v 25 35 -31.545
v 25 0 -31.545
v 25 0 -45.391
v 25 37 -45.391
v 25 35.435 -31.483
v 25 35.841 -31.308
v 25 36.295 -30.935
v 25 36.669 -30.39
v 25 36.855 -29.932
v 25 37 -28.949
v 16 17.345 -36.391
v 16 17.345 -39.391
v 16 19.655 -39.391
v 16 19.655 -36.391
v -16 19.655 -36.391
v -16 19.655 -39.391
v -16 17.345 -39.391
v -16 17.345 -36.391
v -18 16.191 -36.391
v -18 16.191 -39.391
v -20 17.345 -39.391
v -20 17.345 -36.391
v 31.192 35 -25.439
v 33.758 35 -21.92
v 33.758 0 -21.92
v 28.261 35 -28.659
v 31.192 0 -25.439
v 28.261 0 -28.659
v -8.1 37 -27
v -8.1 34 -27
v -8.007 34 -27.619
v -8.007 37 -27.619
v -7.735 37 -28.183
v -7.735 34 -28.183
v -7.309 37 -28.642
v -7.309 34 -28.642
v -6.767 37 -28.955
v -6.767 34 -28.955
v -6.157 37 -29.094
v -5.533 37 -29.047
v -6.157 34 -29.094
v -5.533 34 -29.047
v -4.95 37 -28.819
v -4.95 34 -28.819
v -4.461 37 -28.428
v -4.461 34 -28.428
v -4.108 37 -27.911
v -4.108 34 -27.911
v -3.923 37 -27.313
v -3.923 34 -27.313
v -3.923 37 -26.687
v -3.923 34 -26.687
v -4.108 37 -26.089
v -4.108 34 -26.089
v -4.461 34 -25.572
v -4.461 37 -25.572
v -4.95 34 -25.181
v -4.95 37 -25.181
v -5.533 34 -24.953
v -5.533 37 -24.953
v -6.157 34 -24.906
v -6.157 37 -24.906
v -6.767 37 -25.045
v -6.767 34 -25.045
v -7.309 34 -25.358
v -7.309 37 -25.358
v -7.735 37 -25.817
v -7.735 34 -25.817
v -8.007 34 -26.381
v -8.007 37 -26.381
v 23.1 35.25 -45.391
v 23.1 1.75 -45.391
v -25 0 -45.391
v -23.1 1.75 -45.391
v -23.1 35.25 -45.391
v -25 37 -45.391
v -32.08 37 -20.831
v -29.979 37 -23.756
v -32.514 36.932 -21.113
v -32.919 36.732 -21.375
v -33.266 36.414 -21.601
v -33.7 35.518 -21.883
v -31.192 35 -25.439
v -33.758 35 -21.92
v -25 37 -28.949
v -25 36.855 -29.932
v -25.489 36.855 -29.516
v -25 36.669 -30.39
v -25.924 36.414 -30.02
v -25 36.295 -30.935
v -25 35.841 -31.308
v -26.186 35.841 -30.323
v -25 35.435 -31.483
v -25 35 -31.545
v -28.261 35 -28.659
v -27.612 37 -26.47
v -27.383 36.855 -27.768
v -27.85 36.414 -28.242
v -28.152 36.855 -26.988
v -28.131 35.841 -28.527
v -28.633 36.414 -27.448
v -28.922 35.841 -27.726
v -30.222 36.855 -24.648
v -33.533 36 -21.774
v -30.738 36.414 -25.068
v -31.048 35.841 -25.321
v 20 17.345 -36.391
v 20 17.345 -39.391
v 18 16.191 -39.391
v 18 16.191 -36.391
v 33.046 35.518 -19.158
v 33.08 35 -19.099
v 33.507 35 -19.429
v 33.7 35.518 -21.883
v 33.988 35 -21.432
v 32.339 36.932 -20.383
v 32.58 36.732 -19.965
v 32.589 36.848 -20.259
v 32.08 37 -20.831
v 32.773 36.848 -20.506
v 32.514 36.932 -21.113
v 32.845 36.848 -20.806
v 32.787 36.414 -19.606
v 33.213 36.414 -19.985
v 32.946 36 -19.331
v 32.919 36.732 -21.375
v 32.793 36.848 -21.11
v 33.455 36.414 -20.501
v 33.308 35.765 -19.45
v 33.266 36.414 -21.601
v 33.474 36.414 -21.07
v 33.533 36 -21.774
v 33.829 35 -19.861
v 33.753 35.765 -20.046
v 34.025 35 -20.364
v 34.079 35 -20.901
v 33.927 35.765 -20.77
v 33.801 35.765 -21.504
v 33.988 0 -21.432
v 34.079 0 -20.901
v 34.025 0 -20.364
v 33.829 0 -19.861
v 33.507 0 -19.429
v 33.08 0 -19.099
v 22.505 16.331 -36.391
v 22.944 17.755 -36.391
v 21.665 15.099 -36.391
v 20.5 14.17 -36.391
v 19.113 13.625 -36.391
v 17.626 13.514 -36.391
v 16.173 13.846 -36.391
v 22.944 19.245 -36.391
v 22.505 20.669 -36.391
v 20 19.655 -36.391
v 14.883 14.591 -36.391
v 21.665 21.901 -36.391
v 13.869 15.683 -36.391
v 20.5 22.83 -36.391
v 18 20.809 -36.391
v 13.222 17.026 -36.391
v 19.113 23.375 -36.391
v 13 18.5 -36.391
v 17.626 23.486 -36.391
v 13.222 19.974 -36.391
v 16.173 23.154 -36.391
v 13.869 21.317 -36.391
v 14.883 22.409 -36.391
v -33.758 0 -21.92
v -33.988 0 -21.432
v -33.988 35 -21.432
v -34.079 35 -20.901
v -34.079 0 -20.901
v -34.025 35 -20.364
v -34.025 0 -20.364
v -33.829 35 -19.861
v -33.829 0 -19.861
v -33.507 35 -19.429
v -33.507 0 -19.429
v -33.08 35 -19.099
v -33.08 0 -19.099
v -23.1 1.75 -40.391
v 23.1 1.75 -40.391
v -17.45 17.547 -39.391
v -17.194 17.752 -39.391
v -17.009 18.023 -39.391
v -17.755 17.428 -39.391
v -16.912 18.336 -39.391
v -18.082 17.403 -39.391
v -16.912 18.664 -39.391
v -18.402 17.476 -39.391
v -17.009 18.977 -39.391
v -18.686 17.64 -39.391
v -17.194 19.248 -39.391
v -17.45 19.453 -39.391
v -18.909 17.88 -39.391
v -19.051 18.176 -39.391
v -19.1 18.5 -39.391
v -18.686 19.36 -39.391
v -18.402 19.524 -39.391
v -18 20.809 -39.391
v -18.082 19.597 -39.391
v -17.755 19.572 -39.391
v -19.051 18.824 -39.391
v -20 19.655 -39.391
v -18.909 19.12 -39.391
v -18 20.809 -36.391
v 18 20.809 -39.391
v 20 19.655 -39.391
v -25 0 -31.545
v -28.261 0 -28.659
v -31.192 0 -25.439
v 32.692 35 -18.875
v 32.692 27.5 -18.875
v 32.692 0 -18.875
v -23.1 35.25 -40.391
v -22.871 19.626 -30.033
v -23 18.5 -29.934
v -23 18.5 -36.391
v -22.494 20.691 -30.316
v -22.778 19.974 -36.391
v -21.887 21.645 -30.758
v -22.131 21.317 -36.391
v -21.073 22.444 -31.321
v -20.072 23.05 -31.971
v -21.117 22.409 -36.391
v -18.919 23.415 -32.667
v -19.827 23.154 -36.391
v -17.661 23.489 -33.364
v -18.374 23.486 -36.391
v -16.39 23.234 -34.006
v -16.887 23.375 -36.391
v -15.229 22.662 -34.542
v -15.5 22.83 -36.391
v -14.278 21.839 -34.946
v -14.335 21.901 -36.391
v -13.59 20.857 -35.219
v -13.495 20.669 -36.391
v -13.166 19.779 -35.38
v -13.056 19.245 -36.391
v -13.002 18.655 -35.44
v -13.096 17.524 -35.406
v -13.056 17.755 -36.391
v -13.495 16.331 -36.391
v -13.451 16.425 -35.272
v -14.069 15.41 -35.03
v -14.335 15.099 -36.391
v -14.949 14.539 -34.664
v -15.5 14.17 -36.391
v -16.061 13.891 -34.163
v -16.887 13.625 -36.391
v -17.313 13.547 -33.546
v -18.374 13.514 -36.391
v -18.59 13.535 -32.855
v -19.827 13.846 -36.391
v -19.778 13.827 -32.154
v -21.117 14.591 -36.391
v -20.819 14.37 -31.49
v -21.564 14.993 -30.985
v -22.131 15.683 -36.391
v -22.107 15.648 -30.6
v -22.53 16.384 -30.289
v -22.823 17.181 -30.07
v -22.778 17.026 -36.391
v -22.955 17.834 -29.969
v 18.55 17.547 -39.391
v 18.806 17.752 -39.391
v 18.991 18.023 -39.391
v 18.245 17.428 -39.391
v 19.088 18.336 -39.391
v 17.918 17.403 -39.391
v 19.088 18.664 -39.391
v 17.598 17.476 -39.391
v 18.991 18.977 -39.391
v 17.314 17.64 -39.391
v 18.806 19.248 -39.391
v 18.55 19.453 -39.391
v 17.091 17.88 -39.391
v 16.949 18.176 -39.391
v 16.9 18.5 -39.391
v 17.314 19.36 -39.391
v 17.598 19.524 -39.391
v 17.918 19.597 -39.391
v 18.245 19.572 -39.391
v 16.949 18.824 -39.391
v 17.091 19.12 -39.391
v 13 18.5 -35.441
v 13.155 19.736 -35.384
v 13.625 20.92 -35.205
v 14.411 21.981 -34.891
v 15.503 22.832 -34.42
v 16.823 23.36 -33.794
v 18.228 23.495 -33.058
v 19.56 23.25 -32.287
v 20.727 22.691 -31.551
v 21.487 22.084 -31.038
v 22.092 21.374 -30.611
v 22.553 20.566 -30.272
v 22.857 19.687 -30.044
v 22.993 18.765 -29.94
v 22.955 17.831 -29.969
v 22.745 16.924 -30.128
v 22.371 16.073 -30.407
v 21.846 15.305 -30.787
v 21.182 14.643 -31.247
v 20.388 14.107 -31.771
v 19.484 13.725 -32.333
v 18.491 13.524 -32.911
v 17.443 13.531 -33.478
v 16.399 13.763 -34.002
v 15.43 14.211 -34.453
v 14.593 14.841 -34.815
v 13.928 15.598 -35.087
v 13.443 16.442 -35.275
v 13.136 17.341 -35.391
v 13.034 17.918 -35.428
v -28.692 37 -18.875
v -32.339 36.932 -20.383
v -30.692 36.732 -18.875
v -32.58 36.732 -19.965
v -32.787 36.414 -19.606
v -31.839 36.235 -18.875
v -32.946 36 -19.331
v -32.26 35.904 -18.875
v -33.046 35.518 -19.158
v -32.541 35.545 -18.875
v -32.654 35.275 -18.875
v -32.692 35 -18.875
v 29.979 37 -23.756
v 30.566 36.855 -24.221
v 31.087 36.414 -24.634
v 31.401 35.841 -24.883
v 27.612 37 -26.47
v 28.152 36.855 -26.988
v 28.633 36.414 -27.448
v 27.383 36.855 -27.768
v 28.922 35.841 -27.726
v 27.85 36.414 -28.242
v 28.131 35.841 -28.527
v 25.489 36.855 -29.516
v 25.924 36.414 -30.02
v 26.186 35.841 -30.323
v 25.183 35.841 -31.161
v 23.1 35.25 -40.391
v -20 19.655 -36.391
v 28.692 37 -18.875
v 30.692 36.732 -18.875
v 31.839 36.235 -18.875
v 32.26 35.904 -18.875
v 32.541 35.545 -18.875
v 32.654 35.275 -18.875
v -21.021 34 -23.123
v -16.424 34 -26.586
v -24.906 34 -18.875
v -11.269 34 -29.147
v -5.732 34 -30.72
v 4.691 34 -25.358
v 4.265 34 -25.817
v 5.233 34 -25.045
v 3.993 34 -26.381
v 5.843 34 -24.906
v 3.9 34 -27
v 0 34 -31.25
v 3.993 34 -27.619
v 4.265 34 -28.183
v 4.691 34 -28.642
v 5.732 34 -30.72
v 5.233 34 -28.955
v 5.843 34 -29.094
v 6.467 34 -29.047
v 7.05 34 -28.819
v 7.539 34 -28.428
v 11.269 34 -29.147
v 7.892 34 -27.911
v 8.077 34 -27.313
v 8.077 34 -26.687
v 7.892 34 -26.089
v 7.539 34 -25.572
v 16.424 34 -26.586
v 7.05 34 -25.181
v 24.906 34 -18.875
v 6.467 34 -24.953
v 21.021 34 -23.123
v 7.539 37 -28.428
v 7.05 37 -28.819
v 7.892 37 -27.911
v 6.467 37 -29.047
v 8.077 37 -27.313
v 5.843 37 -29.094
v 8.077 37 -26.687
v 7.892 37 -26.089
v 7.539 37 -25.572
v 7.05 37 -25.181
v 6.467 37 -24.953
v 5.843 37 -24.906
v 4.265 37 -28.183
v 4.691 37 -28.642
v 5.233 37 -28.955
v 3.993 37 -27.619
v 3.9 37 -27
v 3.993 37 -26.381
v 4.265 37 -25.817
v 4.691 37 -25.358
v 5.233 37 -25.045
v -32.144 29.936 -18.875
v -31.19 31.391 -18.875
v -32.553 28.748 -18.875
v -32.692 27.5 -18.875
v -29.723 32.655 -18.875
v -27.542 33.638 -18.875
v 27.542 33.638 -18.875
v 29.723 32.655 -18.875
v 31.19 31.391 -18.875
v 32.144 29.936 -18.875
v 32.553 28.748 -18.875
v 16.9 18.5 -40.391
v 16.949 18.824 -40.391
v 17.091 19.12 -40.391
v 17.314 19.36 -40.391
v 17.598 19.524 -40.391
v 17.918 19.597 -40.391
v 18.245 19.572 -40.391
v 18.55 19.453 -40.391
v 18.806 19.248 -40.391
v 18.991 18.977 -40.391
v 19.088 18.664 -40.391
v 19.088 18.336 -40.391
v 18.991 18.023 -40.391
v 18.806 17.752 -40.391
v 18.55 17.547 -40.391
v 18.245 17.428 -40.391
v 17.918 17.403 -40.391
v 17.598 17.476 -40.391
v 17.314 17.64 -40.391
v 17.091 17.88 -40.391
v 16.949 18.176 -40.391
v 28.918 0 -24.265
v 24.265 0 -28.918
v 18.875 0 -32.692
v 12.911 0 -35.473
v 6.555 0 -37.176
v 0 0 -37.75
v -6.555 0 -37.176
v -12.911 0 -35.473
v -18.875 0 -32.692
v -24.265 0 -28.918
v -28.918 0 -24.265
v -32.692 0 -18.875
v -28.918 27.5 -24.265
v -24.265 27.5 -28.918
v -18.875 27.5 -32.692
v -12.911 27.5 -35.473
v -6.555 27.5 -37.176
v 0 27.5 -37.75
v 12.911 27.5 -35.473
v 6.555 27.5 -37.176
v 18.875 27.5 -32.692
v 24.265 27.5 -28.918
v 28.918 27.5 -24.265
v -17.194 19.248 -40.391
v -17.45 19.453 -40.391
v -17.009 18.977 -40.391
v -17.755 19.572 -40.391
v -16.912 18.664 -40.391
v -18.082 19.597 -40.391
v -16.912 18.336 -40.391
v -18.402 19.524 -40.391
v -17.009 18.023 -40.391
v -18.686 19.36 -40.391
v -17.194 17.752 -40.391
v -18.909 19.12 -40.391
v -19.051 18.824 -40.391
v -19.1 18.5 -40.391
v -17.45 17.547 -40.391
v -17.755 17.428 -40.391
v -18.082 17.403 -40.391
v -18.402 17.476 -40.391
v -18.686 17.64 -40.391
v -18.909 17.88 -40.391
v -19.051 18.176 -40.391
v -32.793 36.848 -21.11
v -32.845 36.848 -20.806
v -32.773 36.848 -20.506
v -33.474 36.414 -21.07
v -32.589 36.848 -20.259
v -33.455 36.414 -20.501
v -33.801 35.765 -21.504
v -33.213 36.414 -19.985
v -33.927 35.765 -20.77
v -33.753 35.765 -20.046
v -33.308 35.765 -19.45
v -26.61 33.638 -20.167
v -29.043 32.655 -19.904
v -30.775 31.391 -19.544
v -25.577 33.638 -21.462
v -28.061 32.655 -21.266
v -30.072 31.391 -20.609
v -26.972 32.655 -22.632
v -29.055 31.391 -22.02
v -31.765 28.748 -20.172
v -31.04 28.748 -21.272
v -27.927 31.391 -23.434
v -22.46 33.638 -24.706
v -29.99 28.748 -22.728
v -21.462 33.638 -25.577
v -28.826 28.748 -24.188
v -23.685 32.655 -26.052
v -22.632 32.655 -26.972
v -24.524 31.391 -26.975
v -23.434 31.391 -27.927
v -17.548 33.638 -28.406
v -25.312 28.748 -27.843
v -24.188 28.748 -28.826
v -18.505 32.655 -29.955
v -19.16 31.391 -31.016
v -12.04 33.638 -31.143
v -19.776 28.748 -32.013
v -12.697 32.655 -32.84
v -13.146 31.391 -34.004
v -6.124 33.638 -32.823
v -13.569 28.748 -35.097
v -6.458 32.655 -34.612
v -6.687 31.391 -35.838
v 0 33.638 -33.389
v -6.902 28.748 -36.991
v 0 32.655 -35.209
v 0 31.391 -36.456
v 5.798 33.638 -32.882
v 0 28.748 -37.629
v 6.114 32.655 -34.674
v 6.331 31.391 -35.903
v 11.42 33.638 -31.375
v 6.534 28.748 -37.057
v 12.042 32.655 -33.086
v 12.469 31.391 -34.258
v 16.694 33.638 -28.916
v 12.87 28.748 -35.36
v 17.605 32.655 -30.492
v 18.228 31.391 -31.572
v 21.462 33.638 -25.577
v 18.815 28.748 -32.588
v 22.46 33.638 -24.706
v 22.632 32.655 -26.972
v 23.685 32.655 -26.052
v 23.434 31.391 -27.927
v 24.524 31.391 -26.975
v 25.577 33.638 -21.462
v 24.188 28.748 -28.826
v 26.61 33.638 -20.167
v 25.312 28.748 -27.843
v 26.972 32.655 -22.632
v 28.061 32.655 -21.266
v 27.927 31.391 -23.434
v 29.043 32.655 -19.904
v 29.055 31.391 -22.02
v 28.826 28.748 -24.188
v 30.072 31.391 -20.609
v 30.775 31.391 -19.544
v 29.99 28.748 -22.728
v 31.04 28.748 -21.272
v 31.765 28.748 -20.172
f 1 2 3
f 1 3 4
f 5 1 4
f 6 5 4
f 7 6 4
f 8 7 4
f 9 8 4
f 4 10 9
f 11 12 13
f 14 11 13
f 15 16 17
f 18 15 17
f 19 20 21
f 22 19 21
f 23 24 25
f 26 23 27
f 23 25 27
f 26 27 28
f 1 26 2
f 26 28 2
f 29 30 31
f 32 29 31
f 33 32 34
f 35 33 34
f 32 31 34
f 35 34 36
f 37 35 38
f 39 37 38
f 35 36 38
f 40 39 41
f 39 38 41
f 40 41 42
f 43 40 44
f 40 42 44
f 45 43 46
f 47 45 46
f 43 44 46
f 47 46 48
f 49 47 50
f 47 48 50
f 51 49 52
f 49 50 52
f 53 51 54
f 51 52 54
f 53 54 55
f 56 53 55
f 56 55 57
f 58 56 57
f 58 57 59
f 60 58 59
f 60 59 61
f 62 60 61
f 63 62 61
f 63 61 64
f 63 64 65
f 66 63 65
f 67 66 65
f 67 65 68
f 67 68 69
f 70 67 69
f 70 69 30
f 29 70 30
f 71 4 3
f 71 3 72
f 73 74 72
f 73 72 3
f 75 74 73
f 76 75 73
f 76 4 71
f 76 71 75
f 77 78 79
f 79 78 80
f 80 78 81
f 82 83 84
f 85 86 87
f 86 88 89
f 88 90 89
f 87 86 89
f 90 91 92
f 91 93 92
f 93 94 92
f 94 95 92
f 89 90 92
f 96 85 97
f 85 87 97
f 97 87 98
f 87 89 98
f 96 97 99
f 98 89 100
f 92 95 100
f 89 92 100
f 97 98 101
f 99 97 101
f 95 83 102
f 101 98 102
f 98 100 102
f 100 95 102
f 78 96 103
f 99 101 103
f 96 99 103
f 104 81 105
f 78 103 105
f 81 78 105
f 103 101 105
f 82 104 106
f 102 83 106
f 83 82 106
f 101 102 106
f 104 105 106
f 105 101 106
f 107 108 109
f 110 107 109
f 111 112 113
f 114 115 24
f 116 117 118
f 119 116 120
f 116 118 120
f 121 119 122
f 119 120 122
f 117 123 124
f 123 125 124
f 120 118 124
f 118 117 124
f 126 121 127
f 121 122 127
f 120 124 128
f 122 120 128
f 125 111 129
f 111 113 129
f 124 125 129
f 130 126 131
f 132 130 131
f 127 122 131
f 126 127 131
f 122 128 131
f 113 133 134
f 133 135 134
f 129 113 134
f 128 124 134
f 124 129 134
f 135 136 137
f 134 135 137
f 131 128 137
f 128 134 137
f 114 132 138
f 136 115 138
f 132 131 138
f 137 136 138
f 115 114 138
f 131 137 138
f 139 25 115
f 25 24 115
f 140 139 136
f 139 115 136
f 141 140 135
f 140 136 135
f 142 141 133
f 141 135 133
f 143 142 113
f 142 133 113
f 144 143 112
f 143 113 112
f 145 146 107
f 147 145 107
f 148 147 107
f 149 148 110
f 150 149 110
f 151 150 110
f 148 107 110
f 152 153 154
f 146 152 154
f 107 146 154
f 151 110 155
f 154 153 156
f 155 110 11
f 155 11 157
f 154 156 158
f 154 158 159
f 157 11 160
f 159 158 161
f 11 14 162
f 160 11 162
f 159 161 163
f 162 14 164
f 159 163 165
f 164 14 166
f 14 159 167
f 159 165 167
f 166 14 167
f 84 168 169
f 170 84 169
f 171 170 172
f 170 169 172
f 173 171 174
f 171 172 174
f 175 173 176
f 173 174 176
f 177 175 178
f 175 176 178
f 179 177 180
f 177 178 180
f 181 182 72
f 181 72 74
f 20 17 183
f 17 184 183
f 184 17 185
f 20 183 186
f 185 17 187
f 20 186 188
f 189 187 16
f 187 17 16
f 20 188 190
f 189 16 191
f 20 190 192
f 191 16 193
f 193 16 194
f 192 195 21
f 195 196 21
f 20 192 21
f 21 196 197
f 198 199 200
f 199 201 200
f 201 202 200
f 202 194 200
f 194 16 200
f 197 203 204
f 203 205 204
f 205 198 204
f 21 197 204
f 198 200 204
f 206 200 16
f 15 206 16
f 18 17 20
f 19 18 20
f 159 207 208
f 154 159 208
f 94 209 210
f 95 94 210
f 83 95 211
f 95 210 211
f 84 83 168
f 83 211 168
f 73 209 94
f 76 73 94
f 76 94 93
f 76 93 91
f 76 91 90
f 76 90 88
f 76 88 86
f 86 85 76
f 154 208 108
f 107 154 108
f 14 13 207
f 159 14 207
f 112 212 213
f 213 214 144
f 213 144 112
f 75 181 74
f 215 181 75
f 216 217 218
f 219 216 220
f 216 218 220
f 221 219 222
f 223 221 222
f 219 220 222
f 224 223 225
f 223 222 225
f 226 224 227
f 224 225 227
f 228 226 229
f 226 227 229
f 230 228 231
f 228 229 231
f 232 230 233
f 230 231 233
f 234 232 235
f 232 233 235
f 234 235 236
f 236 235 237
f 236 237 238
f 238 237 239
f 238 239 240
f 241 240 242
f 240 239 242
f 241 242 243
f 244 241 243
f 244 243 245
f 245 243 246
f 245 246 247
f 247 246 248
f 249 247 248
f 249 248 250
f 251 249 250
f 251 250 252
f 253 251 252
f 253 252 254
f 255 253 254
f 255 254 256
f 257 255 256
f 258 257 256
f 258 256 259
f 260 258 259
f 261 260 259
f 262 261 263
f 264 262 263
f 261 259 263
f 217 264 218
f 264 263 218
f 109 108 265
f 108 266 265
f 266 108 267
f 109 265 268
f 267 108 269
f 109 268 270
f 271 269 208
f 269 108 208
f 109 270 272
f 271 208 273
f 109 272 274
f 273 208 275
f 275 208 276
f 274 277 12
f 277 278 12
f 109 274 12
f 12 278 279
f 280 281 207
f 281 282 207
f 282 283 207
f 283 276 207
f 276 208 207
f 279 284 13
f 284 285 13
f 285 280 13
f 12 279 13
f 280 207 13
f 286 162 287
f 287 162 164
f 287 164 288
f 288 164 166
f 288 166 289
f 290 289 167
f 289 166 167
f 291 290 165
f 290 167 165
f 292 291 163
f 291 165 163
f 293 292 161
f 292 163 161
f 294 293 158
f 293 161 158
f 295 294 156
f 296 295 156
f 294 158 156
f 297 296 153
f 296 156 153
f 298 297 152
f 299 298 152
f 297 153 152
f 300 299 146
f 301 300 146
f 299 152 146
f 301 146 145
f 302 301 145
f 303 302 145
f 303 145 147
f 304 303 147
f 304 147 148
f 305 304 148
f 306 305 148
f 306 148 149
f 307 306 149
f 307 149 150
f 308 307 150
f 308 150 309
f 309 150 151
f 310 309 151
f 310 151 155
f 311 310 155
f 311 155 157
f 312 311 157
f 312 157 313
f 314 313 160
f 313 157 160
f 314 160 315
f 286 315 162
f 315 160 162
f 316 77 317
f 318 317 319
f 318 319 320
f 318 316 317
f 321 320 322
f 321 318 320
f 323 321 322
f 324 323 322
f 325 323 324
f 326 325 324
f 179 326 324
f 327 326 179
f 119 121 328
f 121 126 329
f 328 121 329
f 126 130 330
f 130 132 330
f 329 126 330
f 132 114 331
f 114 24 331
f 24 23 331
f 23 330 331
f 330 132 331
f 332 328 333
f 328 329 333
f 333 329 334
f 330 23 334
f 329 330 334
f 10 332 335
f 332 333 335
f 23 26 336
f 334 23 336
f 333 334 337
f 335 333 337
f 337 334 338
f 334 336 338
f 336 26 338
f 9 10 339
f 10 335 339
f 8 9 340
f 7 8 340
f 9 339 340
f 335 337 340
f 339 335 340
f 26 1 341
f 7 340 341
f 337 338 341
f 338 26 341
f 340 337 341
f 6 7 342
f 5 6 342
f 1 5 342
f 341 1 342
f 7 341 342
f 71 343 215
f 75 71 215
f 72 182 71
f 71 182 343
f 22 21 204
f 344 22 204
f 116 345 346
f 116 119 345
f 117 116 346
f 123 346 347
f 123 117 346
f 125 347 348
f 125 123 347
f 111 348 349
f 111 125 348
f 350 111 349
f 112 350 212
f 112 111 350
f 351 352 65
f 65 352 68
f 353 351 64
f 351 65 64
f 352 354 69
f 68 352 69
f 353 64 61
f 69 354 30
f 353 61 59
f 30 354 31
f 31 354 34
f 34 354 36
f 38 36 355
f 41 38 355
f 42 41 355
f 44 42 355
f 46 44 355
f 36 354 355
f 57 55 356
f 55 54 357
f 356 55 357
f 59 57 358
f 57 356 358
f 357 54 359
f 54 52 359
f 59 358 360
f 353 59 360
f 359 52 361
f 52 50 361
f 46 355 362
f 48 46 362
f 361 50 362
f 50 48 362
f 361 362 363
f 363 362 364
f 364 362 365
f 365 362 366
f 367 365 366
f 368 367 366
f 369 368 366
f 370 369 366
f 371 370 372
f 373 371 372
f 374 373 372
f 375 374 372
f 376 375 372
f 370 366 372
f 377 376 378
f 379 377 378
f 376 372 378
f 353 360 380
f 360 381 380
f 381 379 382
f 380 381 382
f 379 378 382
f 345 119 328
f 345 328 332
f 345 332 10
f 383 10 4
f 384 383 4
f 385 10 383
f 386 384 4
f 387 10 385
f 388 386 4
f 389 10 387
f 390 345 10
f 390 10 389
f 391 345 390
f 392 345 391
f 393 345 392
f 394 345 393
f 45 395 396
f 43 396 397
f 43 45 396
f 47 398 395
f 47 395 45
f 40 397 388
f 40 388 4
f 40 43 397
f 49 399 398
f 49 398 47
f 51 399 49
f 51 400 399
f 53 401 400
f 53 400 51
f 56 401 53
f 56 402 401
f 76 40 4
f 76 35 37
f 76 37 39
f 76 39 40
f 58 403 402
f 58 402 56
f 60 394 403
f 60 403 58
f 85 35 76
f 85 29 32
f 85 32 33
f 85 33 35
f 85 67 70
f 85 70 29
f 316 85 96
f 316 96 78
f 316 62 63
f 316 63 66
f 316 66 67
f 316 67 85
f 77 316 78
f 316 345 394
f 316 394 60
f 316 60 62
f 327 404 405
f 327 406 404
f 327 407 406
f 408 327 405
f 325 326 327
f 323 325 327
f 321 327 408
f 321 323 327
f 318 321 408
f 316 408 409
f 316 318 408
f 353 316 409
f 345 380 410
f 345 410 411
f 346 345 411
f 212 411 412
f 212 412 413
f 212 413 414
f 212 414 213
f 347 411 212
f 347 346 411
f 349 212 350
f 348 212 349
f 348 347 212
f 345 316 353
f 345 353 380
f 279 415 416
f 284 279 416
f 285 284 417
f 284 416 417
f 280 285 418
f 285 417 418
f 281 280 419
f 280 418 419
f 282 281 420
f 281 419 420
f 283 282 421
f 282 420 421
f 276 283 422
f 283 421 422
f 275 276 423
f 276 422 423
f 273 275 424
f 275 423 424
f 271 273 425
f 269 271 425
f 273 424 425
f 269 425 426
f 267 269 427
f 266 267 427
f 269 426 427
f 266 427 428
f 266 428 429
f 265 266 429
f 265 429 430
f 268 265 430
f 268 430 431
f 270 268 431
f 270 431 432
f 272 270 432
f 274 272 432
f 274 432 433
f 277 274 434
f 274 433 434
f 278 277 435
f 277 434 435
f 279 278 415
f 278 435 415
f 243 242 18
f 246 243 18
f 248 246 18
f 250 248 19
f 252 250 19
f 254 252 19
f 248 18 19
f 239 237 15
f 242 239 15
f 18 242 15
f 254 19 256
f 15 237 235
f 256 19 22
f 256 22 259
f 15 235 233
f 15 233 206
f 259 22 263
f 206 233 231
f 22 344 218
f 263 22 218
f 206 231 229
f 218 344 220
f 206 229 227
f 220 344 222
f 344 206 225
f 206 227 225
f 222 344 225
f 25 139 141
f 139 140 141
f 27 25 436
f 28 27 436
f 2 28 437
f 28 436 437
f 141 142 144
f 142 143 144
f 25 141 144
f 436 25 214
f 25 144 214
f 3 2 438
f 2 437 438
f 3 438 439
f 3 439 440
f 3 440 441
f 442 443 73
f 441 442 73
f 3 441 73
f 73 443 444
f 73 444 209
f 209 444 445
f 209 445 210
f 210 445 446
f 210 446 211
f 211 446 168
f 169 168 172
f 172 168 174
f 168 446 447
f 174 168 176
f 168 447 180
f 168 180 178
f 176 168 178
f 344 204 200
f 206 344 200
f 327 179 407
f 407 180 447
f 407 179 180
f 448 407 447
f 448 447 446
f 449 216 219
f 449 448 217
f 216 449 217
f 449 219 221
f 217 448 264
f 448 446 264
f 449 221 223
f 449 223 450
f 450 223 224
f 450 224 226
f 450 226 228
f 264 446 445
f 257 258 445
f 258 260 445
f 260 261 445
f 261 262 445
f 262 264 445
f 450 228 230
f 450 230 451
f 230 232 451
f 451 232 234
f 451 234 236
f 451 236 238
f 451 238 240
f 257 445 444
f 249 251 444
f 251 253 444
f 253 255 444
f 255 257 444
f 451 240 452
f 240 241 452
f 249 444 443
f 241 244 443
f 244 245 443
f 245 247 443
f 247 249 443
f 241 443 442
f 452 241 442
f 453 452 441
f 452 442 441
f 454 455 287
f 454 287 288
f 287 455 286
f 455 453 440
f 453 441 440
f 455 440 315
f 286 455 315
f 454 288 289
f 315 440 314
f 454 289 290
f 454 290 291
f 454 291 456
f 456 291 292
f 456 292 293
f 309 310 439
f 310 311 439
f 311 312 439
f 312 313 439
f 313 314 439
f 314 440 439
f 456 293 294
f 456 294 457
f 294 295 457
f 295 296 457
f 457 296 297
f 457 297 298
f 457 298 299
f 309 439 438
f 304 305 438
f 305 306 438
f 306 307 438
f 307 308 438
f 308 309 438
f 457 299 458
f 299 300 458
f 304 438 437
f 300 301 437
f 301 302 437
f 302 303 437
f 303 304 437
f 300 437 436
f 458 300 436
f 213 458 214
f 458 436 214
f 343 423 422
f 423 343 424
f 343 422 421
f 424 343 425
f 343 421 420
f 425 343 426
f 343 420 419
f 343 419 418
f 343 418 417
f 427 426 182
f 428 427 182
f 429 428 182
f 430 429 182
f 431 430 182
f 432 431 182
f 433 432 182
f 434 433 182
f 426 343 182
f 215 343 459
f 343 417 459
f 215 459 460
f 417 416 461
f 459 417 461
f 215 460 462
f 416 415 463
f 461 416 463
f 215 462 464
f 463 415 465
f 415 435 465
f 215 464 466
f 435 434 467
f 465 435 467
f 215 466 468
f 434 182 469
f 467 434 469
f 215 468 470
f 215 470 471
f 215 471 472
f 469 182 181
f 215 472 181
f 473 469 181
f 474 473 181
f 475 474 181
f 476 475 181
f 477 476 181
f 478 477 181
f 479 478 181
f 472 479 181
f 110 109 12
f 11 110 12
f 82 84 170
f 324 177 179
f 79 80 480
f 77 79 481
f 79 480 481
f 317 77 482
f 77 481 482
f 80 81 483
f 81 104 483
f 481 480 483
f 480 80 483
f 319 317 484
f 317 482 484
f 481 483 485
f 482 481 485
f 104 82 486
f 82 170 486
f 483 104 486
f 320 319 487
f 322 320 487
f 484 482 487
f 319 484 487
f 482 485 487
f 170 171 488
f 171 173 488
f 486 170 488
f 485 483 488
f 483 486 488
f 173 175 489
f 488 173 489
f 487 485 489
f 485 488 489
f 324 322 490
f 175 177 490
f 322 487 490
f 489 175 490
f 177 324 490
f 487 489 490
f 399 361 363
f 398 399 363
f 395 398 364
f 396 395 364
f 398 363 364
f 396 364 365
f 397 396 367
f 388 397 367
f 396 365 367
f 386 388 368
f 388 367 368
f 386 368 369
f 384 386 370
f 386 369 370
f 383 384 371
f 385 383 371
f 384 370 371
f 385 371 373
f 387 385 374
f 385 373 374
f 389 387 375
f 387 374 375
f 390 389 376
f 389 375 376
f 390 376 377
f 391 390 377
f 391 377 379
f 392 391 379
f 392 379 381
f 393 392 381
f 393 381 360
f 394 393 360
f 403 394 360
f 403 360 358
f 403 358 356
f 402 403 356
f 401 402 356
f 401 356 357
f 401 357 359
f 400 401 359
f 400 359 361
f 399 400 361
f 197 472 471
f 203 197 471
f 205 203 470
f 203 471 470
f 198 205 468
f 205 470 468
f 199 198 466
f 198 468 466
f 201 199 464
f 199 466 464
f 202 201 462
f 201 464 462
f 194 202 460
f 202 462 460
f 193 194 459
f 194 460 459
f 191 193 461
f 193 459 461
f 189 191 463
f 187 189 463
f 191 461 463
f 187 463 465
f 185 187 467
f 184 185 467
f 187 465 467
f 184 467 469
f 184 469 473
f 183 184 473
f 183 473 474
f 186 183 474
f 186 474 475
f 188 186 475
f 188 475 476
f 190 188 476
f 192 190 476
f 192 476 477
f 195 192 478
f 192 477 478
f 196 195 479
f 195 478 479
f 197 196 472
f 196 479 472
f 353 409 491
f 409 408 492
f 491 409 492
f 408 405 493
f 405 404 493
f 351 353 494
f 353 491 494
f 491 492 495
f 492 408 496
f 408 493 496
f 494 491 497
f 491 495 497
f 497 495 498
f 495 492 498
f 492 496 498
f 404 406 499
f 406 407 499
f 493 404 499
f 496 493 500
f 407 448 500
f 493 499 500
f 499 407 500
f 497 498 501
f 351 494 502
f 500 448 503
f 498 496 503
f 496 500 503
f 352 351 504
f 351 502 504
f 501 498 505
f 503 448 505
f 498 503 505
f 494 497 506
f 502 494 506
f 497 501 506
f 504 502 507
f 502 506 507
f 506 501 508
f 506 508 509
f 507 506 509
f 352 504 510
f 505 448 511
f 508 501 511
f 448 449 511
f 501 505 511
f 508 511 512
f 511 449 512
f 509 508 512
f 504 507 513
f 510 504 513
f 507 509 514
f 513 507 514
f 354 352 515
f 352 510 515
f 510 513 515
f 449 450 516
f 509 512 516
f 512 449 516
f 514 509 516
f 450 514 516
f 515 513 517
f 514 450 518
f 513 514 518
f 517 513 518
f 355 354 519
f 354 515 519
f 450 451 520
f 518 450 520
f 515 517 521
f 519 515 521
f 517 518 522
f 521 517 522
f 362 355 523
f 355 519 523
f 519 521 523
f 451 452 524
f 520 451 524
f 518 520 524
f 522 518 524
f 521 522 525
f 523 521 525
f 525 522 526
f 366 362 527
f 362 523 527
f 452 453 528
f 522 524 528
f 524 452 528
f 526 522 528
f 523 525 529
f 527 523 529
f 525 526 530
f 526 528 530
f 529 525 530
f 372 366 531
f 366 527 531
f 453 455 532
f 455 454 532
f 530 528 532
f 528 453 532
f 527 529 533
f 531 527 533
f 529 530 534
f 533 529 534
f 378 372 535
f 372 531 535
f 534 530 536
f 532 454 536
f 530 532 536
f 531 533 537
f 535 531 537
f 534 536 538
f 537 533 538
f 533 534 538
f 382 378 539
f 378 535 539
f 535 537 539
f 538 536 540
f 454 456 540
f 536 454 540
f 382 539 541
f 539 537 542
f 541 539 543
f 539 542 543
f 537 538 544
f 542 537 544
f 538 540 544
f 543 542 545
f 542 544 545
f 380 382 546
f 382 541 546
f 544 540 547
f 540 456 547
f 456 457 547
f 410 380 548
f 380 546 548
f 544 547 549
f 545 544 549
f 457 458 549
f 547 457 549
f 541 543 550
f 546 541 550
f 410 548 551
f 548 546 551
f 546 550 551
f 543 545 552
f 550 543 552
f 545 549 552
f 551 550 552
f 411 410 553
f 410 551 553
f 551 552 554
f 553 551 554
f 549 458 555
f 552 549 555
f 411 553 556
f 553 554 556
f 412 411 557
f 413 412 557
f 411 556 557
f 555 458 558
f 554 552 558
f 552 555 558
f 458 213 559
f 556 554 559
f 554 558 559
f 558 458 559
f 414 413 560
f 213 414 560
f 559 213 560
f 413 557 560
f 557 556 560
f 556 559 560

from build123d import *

# Parameters (mm, degrees)
BOSS_EXTRUDE2_DEPTH = 37
BOSS_EXTRUDE4_DEPTH = 3
FILLET1_R           = 6.5
SKETCH5_R           = 2.1
CUT_EXTRUDE1_DEPTH  = 5
SKETCH6_W           = 50
SKETCH6_H           = 37
SKETCH6_W_2         = 46.2
SKETCH6_H_2         = 33.5
BOSS_EXTRUDE5_DEPTH = 5
SKETCH7_R           = 1.1
CUT_EXTRUDE2_DEPTH  = 1
CUT_EXTRUDE3_DEPTH  = 3
SKETCH9_R           = 5
CUT_EXTRUDE4_DEPTH  = 18.515687401
FILLET2_R           = 2


with BuildPart() as part:
    # Sketch2 → Boss-Extrude2 (new body)
    with BuildSketch(Plane(origin=(0, 0, 0), x_dir=(1, 0, 0), z_dir=(0, 1, 0))):
        with BuildLine():
            Line((32.692458993, 18.875), (34.857522502, 20.125))
            ThreePointArc((34.857522502, 20.125), (30.468551498, 26.300757966), (25, 31.544611267))
            Line((25, 31.544611267), (25, 40.390687301))
            Line((25, 40.390687301), (-25, 40.390687301))
            Line((-25, 40.390687301), (-25, 31.544611267))
            ThreePointArc((-25, 31.544611267), (-30.468551498, 26.300757966), (-34.857522502, 20.125))
            Line((-34.857522502, 20.125), (-32.692458993, 18.875))
            ThreePointArc((-32.692458993, 18.875), (0, 37.75), (32.692458993, 18.875))
        make_face()
    extrude(amount=BOSS_EXTRUDE2_DEPTH)

    # Sketch4 → Boss-Extrude4 (add)
    with BuildSketch(Plane(origin=(0, 37, 0), x_dir=(1, 0, 0), z_dir=(0, 1, 0))):
        with BuildLine():
            Line((-32.692458993, 18.875), (32.692458993, 18.875))
            Line((32.692458993, 18.875), (34.857522502, 20.125))
            ThreePointArc((34.857522502, 20.125), (0, 40.25), (-34.857522502, 20.125))
            Line((-34.857522502, 20.125), (-32.692458993, 18.875))
        make_face()
    extrude(amount=-BOSS_EXTRUDE4_DEPTH)

    # Fillet1
    fillet1_edges = [part.edges().sort_by_distance(p)[0] for p in [
        (0, 34, -37.75),
    ]]
    fillet(fillet1_edges, radius=FILLET1_R)

    # Sketch5 → Cut-Extrude1 (cut)
    with BuildSketch(Plane(origin=(0, 34, 0), x_dir=(-1, 0, 0), z_dir=(0, -1, 0))):
        with Locations((-6, 27)):
            Circle(SKETCH5_R)
        with Locations((6, 27)):
            Circle(SKETCH5_R)
    extrude(amount=-CUT_EXTRUDE1_DEPTH, mode=Mode.SUBTRACT)

    # Sketch6 → Boss-Extrude5 (add)
    with BuildSketch(Plane(origin=(0, 0, -40.390687301), x_dir=(-1, 0, 0), z_dir=(0, 0, -1))):
        with Locations((0, 18.5)):
            Rectangle(SKETCH6_W, SKETCH6_H)
        with Locations((0, 18.5)):
            Rectangle(SKETCH6_W_2, SKETCH6_H_2, mode=Mode.SUBTRACT)
    extrude(amount=BOSS_EXTRUDE5_DEPTH)

    # Sketch7 → Cut-Extrude2 (cut)
    with BuildSketch(Plane(origin=(0, 0, -40.390687301), x_dir=(-1, 0, 0), z_dir=(0, 0, -1))):
        with Locations((-18, 18.5)):
            Circle(SKETCH7_R)
        with Locations((18, 18.5)):
            Circle(SKETCH7_R)
    extrude(amount=-CUT_EXTRUDE2_DEPTH, mode=Mode.SUBTRACT)

    # Sketch8 → Cut-Extrude3 (cut)
    with BuildSketch(Plane(origin=(0, 0, -39.390687301), x_dir=(-1, 0, 0), z_dir=(0, 0, -1))):
        Polygon((-16, 17.345299462), (-16, 19.654700538), (-18, 20.809401077), (-20, 19.654700538), (-20, 17.345299462), (-18, 16.190598923), align=None)
        Polygon((20, 17.345299462), (20, 19.654700538), (18, 20.809401077), (16, 19.654700538), (16, 17.345299462), (18, 16.190598923), align=None)
    extrude(amount=-CUT_EXTRUDE3_DEPTH, mode=Mode.SUBTRACT)

    # Sketch9 → Cut-Extrude4 (cut, through all)
    with BuildSketch(Plane(origin=(0, 0, -36.390687301), x_dir=(-1, 0, 0), z_dir=(0, 0, -1))):
        with Locations((-18, 18.5)):
            Circle(SKETCH9_R)
        with Locations((18, 18.5)):
            Circle(SKETCH9_R)
    extrude(amount=-CUT_EXTRUDE4_DEPTH, mode=Mode.SUBTRACT)

    # Fillet2
    fillet2_edges = [part.edges().sort_by_distance(p)[0] for p in [
        (34.857522502, 18.5, -20.125),
        (-34.857522502, 18.5, -20.125),
        (-30.468551498, 37, -26.300757966),
        (-33.774990748, 37, -19.5),
        (33.774990748, 37, -19.5),
        (30.468551498, 37, -26.300757966),
    ]]
    fillet(fillet2_edges, radius=FILLET2_R)


solid = part.part
